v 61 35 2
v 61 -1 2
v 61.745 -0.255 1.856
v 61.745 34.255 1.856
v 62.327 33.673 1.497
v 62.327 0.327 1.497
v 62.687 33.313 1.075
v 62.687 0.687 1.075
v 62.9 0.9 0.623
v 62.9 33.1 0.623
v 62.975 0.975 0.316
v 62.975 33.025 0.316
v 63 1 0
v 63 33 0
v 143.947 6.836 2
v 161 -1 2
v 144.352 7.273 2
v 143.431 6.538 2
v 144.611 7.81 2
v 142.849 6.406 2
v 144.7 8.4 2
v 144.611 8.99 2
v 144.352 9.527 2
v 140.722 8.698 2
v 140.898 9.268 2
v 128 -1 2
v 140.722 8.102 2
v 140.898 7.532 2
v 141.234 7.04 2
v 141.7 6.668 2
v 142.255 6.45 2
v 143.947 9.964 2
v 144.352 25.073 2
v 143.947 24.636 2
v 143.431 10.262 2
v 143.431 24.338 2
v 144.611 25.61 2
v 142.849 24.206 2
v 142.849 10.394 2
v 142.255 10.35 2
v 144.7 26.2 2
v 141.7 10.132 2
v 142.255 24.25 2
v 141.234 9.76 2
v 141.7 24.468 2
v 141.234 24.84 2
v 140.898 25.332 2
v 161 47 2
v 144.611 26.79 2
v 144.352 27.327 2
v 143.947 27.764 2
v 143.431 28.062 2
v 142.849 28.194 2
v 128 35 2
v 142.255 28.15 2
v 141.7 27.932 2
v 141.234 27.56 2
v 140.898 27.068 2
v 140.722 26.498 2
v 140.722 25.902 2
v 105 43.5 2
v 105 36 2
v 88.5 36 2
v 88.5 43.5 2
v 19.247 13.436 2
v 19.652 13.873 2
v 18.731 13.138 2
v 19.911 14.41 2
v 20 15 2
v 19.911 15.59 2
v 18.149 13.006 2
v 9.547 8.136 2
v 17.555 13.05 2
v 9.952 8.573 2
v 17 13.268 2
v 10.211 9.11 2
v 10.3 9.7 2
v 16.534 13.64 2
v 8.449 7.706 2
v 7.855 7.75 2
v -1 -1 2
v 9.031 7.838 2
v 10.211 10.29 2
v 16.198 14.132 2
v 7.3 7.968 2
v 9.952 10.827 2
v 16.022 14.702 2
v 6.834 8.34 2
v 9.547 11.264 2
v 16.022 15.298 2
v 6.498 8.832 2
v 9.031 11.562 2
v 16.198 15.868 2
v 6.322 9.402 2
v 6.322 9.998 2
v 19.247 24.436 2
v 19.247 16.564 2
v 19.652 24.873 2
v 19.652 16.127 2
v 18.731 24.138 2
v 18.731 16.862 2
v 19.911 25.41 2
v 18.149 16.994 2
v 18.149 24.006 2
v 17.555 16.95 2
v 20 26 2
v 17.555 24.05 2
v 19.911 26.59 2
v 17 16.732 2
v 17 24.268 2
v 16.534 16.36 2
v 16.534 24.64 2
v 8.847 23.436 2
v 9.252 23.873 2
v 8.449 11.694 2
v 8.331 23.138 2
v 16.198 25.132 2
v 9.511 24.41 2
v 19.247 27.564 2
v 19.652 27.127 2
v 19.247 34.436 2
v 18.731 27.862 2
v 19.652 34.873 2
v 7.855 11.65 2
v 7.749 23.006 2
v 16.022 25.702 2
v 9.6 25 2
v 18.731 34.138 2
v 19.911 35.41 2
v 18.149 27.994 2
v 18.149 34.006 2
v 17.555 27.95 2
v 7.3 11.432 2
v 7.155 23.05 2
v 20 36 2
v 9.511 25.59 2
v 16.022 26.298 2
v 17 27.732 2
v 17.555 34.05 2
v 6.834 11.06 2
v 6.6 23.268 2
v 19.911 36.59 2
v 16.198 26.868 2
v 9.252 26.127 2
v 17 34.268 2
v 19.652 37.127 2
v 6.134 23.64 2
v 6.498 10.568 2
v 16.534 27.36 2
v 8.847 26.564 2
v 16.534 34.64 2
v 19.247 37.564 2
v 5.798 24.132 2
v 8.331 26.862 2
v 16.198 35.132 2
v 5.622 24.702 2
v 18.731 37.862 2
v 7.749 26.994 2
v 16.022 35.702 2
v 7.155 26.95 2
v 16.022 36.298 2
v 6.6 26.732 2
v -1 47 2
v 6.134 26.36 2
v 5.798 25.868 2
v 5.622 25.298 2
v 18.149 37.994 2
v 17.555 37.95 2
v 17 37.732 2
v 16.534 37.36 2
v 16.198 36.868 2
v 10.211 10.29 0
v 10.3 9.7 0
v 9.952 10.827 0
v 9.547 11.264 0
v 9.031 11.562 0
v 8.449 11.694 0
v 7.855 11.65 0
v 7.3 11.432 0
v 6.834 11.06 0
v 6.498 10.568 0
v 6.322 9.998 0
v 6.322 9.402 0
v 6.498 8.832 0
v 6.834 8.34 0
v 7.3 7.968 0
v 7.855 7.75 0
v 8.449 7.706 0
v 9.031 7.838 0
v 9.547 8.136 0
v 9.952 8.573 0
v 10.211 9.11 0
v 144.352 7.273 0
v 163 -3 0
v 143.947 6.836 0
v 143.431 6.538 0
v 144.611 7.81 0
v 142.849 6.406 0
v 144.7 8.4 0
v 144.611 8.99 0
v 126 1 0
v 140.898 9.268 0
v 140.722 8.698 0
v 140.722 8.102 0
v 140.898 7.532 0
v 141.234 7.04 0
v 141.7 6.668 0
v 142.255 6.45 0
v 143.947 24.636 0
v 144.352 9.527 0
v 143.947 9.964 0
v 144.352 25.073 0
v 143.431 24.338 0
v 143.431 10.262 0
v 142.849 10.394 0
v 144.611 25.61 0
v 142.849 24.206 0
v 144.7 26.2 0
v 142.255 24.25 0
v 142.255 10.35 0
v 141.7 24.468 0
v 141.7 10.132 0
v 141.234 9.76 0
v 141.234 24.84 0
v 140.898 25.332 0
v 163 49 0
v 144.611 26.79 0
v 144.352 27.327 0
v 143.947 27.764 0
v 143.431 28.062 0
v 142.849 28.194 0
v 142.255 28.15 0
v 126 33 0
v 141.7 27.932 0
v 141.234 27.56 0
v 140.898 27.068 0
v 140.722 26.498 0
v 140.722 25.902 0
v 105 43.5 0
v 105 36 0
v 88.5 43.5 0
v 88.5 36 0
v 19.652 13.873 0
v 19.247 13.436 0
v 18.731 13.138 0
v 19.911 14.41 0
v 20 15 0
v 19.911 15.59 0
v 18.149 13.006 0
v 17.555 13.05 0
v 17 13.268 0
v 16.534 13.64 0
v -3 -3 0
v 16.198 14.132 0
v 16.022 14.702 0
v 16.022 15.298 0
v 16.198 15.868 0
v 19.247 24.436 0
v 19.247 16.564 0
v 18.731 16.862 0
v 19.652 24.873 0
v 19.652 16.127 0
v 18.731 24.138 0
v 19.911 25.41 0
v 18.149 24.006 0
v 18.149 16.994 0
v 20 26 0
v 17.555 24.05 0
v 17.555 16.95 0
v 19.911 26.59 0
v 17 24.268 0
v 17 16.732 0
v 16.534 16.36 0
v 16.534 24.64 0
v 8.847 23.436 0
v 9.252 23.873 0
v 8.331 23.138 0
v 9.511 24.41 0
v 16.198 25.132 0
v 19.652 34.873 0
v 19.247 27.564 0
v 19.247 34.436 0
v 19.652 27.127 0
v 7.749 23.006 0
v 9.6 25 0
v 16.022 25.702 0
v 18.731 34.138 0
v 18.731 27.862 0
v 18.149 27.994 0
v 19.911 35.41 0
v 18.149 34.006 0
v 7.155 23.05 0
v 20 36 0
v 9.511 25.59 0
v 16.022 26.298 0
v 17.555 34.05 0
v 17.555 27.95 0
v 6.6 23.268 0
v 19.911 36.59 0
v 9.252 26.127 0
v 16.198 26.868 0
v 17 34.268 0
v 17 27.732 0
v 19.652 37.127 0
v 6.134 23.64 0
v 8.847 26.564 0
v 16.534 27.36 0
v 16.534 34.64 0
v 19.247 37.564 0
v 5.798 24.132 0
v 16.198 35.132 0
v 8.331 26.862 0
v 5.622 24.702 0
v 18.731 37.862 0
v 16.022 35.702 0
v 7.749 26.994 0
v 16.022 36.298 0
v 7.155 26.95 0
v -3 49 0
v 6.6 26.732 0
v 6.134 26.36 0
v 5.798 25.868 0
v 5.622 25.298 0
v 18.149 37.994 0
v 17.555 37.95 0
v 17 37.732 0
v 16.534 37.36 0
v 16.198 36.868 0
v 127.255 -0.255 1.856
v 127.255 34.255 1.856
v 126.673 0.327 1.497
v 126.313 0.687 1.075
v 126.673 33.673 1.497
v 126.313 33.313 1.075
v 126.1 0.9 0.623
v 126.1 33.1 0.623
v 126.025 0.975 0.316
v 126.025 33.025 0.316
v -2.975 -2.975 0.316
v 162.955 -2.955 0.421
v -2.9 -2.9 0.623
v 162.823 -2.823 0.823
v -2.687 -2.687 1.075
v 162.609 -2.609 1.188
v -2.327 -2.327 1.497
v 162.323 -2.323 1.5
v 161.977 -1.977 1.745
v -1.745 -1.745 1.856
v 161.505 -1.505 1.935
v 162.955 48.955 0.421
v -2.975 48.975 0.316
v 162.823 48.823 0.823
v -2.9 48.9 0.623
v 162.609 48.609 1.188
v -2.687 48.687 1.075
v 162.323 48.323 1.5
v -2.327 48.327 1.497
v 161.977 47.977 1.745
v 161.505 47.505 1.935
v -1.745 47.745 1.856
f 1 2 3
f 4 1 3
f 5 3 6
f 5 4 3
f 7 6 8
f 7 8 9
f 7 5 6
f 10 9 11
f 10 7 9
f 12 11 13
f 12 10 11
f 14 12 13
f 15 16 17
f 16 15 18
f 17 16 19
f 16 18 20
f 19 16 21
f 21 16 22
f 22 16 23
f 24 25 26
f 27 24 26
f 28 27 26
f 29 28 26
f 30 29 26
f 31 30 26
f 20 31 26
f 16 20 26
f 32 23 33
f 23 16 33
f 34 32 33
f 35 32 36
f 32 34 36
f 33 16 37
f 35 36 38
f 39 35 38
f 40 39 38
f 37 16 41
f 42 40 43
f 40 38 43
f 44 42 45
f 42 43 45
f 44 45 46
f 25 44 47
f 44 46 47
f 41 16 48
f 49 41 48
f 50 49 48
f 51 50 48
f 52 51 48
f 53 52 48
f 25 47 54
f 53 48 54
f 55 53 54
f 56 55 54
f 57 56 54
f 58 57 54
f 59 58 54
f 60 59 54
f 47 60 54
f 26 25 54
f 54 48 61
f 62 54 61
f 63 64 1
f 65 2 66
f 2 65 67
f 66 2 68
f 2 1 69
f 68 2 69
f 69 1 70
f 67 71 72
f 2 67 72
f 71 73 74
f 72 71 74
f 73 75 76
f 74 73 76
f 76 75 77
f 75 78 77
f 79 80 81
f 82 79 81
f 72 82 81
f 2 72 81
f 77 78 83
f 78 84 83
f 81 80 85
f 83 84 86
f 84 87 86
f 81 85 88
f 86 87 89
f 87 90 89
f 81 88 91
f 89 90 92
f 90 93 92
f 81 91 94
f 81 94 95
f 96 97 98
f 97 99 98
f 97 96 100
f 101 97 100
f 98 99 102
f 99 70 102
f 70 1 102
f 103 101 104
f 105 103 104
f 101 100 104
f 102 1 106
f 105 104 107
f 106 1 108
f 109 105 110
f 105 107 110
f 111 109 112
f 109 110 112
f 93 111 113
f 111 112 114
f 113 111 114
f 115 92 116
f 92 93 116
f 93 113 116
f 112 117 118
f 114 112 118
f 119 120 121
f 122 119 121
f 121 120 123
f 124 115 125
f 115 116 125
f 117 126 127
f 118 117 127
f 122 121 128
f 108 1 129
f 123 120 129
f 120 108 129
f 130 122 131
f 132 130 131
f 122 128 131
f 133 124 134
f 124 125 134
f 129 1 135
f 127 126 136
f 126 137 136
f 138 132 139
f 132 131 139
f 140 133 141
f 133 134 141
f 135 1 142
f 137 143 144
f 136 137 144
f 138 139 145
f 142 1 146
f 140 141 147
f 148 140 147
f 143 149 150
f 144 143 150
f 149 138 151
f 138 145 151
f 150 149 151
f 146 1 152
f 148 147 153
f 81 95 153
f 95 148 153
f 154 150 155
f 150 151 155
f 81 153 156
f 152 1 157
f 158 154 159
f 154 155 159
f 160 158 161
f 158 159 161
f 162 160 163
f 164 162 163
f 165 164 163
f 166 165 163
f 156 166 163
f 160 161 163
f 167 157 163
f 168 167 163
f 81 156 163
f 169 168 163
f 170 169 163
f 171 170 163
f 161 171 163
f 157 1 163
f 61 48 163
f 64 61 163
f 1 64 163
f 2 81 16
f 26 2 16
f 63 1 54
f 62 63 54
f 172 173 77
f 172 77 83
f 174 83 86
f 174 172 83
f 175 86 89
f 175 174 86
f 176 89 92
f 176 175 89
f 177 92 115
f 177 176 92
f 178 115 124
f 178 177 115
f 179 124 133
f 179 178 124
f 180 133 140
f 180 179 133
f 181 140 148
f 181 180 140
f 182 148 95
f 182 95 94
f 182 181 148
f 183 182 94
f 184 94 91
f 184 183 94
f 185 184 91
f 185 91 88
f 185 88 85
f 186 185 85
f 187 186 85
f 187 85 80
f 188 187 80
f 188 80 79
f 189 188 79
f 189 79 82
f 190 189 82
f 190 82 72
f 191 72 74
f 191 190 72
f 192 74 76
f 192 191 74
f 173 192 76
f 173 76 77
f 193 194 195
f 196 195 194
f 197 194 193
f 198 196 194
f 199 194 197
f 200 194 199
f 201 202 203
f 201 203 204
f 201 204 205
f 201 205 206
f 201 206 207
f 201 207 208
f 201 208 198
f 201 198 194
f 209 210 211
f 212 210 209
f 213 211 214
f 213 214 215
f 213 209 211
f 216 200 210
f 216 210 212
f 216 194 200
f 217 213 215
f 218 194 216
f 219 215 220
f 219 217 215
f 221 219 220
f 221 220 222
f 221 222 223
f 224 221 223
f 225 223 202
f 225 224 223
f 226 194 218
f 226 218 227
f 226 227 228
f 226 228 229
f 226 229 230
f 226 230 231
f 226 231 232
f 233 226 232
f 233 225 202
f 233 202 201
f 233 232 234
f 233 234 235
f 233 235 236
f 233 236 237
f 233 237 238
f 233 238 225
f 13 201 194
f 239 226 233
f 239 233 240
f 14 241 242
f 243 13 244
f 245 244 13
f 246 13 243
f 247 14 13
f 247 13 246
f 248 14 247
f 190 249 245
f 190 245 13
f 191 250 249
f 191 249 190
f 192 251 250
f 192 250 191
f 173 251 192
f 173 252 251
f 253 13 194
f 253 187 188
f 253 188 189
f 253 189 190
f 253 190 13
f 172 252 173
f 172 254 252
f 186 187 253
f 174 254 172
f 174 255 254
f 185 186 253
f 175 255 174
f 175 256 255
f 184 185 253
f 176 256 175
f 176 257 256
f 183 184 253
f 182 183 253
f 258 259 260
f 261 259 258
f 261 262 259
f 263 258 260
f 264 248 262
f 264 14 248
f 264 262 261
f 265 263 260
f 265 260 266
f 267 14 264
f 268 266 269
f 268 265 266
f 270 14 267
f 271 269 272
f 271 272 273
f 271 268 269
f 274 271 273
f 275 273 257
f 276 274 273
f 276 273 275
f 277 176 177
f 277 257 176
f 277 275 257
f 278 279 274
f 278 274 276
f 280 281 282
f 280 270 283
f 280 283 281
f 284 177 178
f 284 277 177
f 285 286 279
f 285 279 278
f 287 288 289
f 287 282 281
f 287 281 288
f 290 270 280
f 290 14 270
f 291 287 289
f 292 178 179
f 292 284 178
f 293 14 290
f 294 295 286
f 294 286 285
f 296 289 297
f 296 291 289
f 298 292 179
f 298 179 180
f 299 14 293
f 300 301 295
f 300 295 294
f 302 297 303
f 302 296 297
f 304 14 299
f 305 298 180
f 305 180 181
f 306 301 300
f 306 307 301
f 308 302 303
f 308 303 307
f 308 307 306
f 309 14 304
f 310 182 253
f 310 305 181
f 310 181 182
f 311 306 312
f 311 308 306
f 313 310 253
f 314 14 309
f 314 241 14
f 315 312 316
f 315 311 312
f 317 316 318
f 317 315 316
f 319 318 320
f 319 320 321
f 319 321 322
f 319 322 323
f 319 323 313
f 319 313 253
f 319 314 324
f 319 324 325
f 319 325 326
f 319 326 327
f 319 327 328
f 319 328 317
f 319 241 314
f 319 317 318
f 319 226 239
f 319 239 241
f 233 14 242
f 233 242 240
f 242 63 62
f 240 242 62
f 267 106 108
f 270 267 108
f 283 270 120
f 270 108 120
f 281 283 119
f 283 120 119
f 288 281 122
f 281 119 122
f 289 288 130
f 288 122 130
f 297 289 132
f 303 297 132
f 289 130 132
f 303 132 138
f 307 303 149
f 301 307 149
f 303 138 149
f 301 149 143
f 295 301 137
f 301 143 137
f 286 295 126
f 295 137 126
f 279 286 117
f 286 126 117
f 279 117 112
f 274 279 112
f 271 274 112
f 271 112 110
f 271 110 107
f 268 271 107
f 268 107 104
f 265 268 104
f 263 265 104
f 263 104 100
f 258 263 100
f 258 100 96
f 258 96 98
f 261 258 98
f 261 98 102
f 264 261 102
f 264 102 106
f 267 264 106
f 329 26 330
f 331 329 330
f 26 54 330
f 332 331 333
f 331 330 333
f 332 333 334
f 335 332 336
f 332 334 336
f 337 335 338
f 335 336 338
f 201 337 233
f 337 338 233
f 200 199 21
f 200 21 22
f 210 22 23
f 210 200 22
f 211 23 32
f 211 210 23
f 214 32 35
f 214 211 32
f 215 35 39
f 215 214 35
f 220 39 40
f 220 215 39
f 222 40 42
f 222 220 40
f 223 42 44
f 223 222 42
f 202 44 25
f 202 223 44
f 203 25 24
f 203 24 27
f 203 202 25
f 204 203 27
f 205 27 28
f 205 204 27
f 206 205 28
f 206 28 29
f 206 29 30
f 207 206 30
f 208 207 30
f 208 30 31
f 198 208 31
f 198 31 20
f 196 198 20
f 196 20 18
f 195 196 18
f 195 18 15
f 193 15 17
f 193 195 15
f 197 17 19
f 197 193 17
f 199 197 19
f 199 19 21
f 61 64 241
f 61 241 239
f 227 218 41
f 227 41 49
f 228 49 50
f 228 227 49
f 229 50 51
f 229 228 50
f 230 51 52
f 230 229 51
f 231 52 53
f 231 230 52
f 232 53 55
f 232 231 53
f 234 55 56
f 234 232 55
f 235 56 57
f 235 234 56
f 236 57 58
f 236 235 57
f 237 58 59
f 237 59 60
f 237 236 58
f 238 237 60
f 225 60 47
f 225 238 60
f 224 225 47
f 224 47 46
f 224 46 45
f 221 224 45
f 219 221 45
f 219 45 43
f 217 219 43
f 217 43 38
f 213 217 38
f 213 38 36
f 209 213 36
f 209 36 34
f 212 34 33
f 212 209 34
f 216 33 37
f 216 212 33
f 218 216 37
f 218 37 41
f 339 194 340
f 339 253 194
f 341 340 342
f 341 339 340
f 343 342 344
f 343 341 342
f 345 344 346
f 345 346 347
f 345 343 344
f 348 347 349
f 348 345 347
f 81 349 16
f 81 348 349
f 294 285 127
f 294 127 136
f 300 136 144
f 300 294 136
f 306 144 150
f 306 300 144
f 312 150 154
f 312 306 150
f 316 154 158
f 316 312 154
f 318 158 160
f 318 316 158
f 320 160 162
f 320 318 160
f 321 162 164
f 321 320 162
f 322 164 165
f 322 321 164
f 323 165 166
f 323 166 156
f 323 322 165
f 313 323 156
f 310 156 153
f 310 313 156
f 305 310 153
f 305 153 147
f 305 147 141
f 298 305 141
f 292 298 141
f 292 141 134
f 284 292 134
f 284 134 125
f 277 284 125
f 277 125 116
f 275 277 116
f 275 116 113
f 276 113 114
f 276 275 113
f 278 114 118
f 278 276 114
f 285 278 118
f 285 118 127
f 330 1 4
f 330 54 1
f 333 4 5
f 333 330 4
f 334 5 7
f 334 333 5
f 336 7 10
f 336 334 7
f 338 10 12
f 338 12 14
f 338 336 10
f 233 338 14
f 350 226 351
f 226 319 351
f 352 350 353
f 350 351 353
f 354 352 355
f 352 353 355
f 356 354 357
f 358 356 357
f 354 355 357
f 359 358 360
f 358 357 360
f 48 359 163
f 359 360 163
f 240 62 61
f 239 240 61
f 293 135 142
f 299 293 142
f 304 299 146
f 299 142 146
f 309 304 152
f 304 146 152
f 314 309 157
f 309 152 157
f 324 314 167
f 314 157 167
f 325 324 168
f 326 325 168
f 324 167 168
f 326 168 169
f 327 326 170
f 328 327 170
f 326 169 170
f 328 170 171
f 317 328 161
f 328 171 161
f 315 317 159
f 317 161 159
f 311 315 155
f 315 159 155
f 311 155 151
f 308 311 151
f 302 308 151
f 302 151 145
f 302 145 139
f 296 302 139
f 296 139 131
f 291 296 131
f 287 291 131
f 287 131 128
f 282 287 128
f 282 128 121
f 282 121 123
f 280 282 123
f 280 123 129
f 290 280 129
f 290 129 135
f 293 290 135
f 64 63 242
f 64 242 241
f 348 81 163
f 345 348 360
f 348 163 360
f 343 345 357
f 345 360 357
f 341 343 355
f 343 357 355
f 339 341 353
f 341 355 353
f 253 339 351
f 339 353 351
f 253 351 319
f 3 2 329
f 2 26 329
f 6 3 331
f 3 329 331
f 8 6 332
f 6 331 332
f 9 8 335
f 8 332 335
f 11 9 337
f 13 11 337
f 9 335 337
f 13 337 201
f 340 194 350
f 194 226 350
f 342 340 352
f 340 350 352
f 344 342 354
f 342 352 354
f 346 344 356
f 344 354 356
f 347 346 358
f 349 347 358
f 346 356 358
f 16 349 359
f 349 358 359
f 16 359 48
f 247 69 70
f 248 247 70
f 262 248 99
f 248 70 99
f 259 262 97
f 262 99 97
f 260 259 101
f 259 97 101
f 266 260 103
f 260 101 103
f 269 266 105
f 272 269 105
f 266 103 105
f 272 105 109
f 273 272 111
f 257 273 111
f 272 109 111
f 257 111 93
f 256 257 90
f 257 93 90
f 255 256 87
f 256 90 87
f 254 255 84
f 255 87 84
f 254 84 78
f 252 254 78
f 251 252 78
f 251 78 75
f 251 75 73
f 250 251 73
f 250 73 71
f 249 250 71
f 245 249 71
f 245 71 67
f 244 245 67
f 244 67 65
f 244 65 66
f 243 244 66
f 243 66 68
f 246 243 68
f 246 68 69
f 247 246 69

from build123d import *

# Parameters (mm, degrees)
SKICA1_W                 = 160
SKICA1_H                 = 46
SKICA1_R                 = 2
P_IDAT_VYSUNUT_M1_DEPTH  = 2
SKICA2_W                 = 166
SKICA2_H                 = 52
SKICA2_W_2               = 160
SKICA2_H_2               = 46
P_IDAT_VYSUNUT_M4_DEPTH  = 2
SKICA3_W                 = 63
SKICA3_H                 = 32
ODEBRAT_VYSUNUT_M1_DEPTH = 171.217507913
SKICA4_W                 = 16.5
SKICA4_H                 = 7.5
ODEBRAT_VYSUNUT_M2_DEPTH = 171.217507913
ZAOBLIT14_R              = 2
SKICA5_R                 = 2
ODEBRAT_VYSUNUT_M3_DEPTH = 171.217507913
ZAOBLIT16_R              = 2


with BuildPart() as part:
    # Skica1 → Přidat vysunutím1 (new body)
    with BuildSketch(Plane.XY):
        with Locations((80, 23)):
            Rectangle(SKICA1_W, SKICA1_H)
        with Locations((7.6, 25)):
            Circle(SKICA1_R, mode=Mode.SUBTRACT)
        with Locations((8.3, 9.7)):
            Circle(SKICA1_R, mode=Mode.SUBTRACT)
        with Locations((142.7, 26.2)):
            Circle(SKICA1_R, mode=Mode.SUBTRACT)
        with Locations((142.7, 8.4)):
            Circle(SKICA1_R, mode=Mode.SUBTRACT)
    extrude(amount=P_IDAT_VYSUNUT_M1_DEPTH)

    # Skica2 → Přidat vysunutím4 (add)
    with BuildSketch(Plane(origin=(0, 0, 0), x_dir=(-1, 0, 0), z_dir=(0, 0, -1))):
        with Locations((-80, 23)):
            Rectangle(SKICA2_W, SKICA2_H)
        with Locations((-80, 23)):
            Rectangle(SKICA2_W_2, SKICA2_H_2, mode=Mode.SUBTRACT)
    extrude(amount=-P_IDAT_VYSUNUT_M4_DEPTH)

    # Skica3 → Odebrat vysunutím1 (cut, through all)
    with BuildSketch(Plane.XY.offset(2)):
        with Locations((94.5, 17)):
            Rectangle(SKICA3_W, SKICA3_H)
    extrude(amount=-ODEBRAT_VYSUNUT_M1_DEPTH, mode=Mode.SUBTRACT)

    # Skica4 → Odebrat vysunutím2 (cut, through all)
    with BuildSketch(Plane.XY.offset(2)):
        with Locations((96.75, 39.75)):
            Rectangle(SKICA4_W, SKICA4_H)
    extrude(amount=-ODEBRAT_VYSUNUT_M2_DEPTH, mode=Mode.SUBTRACT)

    # Zaoblit14
    zaoblit14_edges = [part.edges().sort_by_distance(p)[0] for p in [
        (-3, 23, 2),
        (80, 49, 2),
        (80, -3, 2),
        (163, 23, 2),
    ]]
    fillet(zaoblit14_edges, radius=ZAOBLIT14_R - 0.0001)  # a hair under: the kernel refuses the full size

    # Skica5 → Odebrat vysunutím3 (cut, through all)
    with BuildSketch(Plane.XY.offset(2)):
        with Locations((18, 15)):
            Circle(SKICA5_R)
        with Locations((18, 26)):
            Circle(SKICA5_R)
        with Locations((18, 36)):
            Circle(SKICA5_R)
    extrude(amount=-ODEBRAT_VYSUNUT_M3_DEPTH, mode=Mode.SUBTRACT)

    # Zaoblit16
    zaoblit16_edges = [part.edges().sort_by_distance(p)[0] for p in [
        (94.5, 1, 2),
        (126, 17, 2),
        (94.5, 33, 2),
        (63, 17, 2),
    ]]
    fillet(zaoblit16_edges, radius=ZAOBLIT16_R - 0.0001)  # a hair under: the kernel refuses the full size


solid = part.part
